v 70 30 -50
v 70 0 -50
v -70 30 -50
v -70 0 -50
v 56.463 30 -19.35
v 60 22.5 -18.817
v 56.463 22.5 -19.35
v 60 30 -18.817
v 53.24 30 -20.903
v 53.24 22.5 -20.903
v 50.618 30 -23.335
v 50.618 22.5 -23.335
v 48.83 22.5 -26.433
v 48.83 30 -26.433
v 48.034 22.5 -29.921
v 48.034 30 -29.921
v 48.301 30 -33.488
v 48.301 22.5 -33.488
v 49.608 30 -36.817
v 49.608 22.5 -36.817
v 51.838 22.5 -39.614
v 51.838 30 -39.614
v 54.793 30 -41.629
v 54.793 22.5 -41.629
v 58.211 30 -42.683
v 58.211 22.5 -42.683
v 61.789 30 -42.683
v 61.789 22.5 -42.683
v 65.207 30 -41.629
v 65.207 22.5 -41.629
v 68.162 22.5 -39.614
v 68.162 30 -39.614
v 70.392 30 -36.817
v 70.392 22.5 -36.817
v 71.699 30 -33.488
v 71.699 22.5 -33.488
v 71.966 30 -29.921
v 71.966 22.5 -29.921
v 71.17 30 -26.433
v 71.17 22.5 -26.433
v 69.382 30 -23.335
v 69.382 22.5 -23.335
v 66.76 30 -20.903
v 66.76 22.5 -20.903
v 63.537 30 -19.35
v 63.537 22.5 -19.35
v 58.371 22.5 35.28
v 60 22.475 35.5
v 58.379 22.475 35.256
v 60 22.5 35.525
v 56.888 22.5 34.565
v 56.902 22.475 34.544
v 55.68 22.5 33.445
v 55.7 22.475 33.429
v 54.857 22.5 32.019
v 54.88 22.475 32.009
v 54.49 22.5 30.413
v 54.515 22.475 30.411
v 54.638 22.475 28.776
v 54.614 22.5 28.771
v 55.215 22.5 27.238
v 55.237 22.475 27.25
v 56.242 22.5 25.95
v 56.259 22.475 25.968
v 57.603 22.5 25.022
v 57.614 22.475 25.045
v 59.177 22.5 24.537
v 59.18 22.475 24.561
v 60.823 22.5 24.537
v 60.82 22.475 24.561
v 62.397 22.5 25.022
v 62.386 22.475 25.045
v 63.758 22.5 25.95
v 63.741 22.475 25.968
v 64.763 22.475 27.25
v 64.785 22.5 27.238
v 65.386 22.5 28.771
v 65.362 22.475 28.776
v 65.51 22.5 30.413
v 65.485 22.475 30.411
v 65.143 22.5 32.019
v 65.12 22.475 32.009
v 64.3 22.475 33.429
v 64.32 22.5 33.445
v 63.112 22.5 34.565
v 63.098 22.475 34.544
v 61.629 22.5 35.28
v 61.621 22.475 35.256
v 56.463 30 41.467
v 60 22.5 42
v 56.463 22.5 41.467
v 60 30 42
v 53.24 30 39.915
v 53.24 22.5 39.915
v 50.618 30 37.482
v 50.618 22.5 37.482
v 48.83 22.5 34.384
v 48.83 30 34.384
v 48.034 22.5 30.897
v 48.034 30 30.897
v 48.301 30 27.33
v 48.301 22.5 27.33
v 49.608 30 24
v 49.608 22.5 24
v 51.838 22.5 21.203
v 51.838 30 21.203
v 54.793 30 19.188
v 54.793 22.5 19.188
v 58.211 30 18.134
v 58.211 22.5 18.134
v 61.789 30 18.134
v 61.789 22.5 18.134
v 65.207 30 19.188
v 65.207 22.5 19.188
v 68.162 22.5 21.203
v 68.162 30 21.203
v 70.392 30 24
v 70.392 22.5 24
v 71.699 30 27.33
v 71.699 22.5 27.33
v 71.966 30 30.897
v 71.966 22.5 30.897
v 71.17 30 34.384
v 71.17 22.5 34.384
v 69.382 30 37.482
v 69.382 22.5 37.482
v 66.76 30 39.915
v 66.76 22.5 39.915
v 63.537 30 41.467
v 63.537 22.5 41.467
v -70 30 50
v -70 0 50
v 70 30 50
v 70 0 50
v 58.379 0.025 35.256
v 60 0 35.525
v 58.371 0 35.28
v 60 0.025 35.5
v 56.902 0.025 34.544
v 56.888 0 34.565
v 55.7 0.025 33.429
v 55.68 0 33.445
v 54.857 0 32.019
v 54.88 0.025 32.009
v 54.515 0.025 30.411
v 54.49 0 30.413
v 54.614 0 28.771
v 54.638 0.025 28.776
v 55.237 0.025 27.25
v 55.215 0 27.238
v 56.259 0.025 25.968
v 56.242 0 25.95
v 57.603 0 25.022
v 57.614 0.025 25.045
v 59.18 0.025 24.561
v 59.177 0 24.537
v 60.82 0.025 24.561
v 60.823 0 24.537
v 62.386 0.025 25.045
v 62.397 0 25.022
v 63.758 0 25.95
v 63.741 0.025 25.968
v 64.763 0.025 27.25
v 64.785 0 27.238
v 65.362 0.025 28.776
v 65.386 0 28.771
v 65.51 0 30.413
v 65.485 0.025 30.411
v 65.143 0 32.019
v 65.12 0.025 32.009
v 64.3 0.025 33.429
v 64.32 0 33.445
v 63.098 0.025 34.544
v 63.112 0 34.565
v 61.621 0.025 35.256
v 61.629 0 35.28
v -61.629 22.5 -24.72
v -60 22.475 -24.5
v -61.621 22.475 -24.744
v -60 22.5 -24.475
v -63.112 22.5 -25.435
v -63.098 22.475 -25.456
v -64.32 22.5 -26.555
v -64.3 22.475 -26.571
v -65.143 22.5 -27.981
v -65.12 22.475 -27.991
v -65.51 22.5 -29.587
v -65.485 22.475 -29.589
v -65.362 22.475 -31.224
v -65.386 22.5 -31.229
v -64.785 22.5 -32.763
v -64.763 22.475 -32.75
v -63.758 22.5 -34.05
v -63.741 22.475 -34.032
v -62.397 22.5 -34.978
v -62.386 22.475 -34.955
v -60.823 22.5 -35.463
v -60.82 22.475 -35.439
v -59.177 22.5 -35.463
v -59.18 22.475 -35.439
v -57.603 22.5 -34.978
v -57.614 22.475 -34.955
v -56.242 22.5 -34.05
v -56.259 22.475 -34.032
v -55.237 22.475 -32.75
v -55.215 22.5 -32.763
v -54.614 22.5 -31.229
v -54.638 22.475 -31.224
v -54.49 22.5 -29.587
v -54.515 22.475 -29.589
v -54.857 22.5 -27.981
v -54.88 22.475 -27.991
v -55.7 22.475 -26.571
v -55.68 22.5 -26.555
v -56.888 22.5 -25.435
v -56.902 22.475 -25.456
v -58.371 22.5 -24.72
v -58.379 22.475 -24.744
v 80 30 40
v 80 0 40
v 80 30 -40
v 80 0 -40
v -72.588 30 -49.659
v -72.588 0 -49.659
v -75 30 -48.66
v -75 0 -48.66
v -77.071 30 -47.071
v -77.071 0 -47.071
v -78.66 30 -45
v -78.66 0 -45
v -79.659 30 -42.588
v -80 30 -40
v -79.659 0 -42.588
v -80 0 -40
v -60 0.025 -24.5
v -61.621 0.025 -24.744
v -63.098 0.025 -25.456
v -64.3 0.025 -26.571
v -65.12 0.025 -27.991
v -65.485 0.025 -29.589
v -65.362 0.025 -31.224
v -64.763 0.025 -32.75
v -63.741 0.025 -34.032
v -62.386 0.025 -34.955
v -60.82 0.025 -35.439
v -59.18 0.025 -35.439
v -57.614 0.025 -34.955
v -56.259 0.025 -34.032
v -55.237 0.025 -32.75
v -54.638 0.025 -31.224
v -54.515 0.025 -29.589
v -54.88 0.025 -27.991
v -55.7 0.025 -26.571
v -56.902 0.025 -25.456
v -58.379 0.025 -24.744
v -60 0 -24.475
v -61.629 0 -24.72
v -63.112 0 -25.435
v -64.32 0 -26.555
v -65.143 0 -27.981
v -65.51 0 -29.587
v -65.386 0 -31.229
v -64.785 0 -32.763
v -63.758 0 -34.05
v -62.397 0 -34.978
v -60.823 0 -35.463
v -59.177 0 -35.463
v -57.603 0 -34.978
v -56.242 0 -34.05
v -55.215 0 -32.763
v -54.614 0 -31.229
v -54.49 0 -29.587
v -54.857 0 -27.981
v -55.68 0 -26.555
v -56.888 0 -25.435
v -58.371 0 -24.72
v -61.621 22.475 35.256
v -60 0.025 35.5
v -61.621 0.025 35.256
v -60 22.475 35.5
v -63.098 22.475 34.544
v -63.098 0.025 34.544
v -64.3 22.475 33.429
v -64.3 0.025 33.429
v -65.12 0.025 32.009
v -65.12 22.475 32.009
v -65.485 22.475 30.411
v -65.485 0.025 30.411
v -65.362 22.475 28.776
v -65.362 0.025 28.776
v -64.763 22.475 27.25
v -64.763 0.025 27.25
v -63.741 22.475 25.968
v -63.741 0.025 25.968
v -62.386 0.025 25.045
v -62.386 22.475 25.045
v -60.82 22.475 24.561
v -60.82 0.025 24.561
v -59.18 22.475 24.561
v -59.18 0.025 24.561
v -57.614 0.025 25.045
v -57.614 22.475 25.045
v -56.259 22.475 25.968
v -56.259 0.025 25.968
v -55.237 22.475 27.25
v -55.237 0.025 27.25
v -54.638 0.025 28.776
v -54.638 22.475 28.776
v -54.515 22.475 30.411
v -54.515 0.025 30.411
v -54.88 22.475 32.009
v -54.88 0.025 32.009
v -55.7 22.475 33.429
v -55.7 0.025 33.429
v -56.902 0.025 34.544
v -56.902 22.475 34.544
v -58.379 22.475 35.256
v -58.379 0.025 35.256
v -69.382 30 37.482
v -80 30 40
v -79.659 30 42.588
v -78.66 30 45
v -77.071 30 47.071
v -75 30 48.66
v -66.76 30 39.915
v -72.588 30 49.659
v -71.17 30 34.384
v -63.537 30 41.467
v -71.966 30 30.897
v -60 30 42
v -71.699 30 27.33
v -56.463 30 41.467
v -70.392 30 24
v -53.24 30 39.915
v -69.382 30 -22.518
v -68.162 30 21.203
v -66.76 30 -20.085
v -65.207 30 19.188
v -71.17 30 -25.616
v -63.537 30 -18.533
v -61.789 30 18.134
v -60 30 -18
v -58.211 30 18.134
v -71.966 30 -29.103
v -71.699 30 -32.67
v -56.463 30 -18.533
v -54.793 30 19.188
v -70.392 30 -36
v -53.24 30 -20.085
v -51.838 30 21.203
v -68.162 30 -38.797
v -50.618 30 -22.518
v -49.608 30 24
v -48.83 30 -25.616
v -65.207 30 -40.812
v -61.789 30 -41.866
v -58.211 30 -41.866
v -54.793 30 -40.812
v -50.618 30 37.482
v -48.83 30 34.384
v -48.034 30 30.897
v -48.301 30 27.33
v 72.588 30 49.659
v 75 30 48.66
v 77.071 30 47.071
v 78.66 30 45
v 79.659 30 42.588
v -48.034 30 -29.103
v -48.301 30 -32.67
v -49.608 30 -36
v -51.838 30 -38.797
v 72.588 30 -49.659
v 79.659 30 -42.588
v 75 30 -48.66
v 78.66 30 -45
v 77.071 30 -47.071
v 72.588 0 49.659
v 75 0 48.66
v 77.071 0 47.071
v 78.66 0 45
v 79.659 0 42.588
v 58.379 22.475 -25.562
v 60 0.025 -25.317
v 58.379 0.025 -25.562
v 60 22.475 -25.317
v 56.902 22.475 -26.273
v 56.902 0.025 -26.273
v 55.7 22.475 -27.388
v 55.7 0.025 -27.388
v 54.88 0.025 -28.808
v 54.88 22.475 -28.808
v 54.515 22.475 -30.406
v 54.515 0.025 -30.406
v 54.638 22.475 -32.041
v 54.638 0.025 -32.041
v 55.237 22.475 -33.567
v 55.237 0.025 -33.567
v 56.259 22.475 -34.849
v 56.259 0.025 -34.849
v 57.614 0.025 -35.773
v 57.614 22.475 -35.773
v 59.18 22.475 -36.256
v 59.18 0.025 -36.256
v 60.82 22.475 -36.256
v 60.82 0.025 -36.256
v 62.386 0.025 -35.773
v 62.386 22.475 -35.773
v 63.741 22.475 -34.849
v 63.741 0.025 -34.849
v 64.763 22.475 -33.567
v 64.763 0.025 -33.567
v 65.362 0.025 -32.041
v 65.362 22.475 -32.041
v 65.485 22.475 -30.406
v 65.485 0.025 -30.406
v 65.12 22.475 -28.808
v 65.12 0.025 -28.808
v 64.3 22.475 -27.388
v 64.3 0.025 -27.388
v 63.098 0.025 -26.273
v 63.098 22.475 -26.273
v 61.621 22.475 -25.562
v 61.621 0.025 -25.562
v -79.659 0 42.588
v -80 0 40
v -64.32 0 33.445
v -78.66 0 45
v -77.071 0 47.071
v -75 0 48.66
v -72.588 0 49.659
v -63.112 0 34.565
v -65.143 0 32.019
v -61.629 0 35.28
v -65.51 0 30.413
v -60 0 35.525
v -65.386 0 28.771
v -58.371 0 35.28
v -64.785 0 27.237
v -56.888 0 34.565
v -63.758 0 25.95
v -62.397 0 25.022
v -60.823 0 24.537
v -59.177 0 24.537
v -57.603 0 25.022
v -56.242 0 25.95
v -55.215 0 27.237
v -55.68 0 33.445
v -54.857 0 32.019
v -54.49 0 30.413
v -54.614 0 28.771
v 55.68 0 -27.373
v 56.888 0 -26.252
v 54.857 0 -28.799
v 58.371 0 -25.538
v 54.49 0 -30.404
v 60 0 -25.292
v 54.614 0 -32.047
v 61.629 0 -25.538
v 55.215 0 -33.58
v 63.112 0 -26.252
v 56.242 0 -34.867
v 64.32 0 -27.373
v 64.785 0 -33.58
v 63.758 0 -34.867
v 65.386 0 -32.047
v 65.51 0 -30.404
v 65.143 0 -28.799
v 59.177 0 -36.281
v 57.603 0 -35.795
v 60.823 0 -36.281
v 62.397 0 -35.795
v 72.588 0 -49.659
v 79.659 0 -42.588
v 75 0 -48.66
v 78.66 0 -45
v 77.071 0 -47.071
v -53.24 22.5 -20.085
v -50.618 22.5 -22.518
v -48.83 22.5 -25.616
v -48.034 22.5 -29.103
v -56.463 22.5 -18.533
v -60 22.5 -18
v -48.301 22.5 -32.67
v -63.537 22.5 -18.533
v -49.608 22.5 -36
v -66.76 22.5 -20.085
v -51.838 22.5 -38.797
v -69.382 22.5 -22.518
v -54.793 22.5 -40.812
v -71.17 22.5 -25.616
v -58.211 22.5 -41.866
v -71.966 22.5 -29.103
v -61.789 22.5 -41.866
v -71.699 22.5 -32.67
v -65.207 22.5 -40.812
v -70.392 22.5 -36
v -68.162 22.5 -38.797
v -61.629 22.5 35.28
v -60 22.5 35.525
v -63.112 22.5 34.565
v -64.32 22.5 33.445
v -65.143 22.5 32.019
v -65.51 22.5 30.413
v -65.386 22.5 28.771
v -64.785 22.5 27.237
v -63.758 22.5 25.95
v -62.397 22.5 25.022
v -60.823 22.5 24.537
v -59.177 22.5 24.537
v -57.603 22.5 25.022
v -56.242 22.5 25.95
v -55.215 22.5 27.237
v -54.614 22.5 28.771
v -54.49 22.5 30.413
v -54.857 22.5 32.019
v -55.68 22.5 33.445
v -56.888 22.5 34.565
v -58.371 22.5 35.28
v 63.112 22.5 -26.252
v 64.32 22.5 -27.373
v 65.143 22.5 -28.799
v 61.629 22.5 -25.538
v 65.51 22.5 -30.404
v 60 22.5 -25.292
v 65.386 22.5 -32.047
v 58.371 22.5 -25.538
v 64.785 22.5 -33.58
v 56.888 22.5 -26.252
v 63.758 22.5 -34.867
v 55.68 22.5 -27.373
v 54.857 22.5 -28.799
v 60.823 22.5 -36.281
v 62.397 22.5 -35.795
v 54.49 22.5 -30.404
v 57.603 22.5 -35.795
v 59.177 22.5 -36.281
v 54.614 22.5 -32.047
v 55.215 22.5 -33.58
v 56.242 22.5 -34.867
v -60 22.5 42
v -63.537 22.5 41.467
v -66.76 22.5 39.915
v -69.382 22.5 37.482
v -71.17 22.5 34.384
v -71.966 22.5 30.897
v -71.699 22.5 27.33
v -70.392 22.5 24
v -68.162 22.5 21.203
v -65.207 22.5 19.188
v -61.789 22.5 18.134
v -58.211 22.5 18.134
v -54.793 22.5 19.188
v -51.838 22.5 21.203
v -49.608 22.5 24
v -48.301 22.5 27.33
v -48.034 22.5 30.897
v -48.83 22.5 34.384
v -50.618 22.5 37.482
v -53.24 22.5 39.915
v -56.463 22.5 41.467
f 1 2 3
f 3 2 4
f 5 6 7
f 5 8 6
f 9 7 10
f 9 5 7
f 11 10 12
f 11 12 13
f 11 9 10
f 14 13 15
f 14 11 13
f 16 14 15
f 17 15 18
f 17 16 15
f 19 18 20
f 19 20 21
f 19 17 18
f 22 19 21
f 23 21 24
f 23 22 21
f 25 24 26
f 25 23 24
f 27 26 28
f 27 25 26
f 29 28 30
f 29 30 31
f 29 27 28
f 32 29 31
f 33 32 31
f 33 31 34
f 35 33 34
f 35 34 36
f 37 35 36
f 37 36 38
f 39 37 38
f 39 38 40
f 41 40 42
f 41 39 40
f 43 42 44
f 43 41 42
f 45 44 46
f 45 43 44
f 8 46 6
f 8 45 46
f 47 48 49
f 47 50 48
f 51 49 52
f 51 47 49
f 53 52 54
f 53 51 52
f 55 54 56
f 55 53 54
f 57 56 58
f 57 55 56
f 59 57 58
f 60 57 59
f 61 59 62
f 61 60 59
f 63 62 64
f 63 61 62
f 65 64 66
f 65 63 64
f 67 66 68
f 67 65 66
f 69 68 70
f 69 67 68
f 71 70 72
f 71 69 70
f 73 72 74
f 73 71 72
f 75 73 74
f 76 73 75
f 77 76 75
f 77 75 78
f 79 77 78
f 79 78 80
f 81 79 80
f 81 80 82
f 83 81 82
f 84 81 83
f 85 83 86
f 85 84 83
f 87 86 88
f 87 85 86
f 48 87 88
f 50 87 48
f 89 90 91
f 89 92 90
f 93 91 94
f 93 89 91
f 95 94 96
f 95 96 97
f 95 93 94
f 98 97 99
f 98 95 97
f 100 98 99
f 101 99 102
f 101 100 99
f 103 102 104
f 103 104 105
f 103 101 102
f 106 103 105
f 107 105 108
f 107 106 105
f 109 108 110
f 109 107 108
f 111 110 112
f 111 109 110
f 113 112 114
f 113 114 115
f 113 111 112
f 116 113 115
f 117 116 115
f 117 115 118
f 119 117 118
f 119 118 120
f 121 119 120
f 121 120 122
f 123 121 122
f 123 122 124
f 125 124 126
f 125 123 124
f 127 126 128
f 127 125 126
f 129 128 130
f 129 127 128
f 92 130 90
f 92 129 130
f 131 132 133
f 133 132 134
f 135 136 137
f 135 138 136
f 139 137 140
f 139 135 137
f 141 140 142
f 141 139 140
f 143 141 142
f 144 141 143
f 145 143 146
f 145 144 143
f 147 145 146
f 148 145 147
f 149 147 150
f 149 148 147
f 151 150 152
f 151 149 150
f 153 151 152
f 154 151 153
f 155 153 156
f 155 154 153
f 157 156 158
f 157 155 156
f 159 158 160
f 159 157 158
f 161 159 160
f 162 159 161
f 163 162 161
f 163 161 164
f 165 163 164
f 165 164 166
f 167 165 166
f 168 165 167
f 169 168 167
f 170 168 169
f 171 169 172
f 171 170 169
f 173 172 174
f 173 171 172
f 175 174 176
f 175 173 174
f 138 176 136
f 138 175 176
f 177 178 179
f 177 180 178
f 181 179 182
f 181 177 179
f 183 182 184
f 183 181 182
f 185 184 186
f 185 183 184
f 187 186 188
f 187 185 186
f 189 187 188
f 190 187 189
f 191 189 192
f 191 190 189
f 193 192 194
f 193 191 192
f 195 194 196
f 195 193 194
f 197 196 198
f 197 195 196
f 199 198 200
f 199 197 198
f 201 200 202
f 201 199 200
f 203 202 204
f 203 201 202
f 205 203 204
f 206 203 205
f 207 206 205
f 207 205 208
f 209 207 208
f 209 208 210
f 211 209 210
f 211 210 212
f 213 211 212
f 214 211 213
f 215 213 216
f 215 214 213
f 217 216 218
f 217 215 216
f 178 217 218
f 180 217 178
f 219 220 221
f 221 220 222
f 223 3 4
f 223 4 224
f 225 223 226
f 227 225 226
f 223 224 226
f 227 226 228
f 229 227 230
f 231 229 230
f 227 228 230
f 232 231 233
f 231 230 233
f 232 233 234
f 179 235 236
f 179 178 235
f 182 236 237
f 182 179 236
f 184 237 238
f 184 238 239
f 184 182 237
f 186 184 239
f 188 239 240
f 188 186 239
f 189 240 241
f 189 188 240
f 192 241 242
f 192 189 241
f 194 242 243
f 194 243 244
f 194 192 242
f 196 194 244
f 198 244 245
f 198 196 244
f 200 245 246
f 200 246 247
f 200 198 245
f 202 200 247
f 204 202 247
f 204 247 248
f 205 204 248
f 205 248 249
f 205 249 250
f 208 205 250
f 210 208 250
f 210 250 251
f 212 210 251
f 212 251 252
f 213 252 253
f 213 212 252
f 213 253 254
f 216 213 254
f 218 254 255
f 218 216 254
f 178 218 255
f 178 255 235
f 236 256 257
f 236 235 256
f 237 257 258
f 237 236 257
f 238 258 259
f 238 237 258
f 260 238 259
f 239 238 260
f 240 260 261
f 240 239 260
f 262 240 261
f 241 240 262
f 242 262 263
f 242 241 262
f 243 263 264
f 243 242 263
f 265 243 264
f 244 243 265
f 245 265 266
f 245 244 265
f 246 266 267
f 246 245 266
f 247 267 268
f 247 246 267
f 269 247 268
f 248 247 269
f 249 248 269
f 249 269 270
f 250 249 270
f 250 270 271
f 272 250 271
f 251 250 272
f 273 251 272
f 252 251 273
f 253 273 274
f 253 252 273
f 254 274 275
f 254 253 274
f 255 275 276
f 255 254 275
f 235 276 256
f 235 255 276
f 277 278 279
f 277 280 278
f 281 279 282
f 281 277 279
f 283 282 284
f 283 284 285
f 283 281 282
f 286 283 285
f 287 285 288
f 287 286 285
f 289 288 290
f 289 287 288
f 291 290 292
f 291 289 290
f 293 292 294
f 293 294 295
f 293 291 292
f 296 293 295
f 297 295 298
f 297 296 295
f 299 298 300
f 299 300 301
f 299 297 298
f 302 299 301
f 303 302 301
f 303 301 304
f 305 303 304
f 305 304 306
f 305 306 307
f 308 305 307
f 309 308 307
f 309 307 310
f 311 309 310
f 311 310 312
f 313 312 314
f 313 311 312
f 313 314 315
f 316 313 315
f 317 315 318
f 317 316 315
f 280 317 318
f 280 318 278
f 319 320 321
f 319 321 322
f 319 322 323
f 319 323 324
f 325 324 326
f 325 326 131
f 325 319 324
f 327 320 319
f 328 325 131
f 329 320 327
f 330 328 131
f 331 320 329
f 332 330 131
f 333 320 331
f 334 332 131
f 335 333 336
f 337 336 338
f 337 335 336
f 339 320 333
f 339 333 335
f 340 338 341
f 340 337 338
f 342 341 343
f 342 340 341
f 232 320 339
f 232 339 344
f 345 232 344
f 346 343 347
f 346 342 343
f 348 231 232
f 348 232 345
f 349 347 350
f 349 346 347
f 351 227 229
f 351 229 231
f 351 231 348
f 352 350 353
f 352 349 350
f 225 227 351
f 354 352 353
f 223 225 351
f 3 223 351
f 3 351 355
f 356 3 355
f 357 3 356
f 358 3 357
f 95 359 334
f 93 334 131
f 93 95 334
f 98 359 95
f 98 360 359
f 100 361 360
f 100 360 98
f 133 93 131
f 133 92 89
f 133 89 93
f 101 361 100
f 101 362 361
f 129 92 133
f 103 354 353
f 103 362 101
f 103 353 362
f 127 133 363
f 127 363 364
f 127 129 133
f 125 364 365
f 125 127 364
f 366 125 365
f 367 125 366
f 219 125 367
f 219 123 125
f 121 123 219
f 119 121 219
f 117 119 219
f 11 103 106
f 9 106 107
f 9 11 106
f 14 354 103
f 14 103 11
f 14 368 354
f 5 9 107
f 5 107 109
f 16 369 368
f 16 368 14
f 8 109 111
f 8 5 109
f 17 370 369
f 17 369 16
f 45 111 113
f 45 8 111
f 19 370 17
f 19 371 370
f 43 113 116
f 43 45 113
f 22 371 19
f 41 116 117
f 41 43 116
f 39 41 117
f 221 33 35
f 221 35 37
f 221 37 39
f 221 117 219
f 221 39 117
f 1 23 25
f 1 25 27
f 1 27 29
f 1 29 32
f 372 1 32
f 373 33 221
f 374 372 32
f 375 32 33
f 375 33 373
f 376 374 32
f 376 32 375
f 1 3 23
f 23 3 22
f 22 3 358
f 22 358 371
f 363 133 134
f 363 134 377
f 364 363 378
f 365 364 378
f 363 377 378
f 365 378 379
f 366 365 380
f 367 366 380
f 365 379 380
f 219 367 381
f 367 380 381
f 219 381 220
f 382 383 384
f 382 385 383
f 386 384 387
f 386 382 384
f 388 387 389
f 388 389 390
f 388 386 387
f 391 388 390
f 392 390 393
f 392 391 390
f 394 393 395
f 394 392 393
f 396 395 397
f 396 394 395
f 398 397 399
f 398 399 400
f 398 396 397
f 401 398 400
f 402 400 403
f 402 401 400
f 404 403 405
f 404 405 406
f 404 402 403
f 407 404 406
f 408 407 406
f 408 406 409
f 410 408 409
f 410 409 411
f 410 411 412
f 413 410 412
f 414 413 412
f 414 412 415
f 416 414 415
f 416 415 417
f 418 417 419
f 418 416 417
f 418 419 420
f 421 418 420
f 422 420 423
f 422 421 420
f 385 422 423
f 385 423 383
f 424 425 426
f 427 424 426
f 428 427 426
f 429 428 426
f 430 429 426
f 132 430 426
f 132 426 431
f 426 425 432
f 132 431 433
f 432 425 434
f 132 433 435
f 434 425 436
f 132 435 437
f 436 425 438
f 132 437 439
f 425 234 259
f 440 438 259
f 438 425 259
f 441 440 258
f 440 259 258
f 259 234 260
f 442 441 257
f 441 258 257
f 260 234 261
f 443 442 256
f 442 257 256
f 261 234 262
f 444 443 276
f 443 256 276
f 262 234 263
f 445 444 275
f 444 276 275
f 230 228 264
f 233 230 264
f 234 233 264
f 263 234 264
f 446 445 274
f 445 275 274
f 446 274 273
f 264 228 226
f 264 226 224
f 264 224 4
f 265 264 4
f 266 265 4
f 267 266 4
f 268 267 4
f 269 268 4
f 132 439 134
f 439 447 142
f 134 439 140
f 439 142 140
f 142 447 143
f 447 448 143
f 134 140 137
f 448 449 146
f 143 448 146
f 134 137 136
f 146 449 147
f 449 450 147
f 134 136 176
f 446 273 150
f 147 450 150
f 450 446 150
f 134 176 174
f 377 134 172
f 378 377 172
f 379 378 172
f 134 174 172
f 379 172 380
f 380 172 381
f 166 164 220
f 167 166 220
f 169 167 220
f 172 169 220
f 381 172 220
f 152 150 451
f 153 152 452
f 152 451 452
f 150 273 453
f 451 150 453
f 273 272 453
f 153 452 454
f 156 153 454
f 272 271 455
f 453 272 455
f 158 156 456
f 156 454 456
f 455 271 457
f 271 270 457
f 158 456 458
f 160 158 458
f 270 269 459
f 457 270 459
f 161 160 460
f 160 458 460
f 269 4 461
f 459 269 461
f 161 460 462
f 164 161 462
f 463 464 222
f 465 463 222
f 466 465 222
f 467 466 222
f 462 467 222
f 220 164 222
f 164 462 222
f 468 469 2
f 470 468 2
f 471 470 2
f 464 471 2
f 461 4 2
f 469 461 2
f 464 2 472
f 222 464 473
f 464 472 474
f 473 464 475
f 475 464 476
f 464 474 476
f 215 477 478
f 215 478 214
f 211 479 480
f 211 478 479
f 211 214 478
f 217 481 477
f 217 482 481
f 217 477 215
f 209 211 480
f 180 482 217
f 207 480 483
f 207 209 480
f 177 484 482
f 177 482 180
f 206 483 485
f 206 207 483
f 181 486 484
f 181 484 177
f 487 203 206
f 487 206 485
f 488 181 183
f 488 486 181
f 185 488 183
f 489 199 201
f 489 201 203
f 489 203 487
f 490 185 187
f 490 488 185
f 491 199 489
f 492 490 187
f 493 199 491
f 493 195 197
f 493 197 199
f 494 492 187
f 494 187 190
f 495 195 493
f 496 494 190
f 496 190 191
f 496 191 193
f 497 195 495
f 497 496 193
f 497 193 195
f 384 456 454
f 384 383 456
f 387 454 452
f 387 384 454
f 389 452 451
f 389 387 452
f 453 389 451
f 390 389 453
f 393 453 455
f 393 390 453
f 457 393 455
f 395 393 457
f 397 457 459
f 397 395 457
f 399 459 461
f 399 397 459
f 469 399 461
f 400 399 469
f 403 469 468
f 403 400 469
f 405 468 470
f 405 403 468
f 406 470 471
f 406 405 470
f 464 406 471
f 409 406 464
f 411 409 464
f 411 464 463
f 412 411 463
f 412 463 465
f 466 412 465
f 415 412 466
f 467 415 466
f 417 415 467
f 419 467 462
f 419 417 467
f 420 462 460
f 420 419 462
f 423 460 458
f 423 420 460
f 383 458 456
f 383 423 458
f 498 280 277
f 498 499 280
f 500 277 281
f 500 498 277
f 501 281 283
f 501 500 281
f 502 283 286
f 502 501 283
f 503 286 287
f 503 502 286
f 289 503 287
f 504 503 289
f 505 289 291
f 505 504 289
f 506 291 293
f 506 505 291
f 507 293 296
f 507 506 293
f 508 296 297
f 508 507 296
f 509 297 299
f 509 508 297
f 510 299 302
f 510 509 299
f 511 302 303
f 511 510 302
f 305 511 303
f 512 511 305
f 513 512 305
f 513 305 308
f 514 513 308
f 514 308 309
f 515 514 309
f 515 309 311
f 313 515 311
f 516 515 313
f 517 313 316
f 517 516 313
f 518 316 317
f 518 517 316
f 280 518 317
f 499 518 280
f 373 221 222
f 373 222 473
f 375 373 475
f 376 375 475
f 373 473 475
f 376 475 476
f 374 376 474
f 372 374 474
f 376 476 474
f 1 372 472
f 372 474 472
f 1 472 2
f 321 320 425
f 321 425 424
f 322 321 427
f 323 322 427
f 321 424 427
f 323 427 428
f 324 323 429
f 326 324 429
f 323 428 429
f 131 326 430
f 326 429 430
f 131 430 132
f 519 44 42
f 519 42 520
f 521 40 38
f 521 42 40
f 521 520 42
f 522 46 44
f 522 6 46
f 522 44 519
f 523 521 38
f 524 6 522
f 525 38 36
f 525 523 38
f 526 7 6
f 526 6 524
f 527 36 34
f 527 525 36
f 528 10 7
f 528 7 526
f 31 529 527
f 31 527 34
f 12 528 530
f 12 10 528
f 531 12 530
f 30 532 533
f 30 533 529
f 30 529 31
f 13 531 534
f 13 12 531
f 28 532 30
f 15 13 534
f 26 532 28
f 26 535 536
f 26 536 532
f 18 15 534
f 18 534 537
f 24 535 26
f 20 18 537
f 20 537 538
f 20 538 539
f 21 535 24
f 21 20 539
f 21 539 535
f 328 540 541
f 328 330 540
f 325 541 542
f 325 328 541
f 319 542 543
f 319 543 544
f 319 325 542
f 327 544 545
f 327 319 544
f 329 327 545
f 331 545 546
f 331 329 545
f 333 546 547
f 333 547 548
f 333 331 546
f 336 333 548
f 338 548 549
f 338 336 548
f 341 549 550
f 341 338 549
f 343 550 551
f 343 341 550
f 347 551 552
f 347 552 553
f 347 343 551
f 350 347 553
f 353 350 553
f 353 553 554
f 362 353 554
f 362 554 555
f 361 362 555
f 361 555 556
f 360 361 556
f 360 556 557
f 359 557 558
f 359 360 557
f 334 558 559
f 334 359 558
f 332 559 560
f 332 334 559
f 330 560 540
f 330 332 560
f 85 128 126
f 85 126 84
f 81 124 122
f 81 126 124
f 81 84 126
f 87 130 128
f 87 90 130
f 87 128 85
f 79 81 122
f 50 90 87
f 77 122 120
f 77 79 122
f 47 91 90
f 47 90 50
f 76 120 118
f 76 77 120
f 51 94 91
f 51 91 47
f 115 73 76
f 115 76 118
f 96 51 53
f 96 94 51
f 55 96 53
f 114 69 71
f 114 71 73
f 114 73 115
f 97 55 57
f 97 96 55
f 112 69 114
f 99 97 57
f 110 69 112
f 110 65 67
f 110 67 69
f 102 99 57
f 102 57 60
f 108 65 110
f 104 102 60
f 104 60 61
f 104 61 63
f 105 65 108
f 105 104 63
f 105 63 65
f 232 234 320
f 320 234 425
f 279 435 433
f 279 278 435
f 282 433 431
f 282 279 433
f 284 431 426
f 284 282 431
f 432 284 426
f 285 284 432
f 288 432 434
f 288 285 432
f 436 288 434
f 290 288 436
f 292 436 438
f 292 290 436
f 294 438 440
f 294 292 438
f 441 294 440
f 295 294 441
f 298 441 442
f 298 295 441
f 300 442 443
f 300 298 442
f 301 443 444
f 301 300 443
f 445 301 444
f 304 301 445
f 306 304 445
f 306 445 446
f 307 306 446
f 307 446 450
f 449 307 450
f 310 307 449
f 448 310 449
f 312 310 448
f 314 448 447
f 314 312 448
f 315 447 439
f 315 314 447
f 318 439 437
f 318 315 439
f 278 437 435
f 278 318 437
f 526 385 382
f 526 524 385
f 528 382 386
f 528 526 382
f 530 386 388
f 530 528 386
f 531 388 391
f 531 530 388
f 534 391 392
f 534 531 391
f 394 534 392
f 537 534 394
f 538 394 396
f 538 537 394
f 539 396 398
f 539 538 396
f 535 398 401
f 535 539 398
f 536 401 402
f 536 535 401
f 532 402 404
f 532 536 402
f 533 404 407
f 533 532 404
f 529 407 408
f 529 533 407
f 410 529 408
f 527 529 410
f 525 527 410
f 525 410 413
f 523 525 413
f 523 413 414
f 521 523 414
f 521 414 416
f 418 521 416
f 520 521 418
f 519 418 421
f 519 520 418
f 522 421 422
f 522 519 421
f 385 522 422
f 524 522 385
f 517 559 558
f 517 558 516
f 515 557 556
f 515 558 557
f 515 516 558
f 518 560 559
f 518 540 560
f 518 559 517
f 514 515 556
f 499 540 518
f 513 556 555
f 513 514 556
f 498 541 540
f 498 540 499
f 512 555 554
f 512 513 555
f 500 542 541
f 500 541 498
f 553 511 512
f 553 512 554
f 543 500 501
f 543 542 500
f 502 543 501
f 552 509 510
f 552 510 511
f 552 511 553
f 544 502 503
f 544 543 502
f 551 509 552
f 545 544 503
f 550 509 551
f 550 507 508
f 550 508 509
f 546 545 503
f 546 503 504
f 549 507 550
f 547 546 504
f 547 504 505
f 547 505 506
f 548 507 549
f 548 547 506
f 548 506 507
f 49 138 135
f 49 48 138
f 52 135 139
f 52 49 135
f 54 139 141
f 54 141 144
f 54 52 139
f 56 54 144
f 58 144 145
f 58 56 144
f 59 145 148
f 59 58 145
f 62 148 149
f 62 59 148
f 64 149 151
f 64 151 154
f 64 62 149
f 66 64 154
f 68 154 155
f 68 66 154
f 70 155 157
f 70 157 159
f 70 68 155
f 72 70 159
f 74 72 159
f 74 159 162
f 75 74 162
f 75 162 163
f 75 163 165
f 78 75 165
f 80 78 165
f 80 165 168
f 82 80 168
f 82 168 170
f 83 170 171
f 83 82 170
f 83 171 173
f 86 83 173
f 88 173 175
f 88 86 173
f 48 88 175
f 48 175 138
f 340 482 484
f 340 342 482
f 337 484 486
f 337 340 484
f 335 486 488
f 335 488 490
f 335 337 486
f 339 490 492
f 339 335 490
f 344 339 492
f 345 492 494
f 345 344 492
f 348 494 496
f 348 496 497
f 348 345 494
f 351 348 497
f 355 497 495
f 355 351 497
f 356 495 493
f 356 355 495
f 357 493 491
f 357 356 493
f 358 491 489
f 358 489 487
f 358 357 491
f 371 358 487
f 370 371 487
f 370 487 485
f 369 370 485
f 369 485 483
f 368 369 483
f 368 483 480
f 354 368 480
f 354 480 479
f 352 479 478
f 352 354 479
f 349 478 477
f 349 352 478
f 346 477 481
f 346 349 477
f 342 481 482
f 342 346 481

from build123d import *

# Parameters (mm, degrees)
SALIENTE_EXTRUIR1_DEPTH                     = 30
REFRENTADO_PARA_TORNILLO_CON_CABEZA_2_COUNT = 2
REFRENTADO_PARA_TORNILLO_CON_CABEZA_2_PITCH = 120.002783684
REFRENTADO_PARA_TORNILLO_CON_CABEZA_3_COUNT = 2
REFRENTADO_PARA_TORNILLO_CON_CABEZA_3_PITCH = 60
REFRENTADO_PARA_TORNILLO_CON_CABEZA_4_COUNT = 2
REFRENTADO_PARA_TORNILLO_CON_CABEZA_4_PITCH = 134.16407865


with BuildPart() as part:
    # Croquis1 → Saliente-Extruir1 (new body)
    with BuildSketch(Plane(origin=(0, 0, 0), x_dir=(1, 0, 0), z_dir=(0, 1, 0))):
        with BuildLine():
            Line((-70, -50), (70, -50))
            ThreePointArc((70, -50), (77.071067812, -47.071067812), (80, -40))
            Line((80, -40), (80, 40))
            ThreePointArc((80, 40), (77.071067812, 47.071067812), (70, 50))
            Line((70, 50), (-70, 50))
            ThreePointArc((-70, 50), (-77.071067812, 47.071067812), (-80, 40))
            Line((-80, 40), (-80, -40))
            ThreePointArc((-80, -40), (-77.071067812, -47.071067812), (-70, -50))
        make_face()
    extrude(amount=SALIENTE_EXTRUIR1_DEPTH)

    # Croquis5 → Refrentado para tornillo con cabeza troncocónica de M101 (revolve, cut)
    with BuildSketch(Plane(origin=(-60, 30, -30), x_dir=(0, 0, 1), z_dir=(1, 0, 0))):
        Polygon((0, 0), (0, 30), (5.525, 30), (5.5, 29.975), (5.5, 7.525), (5.525, 7.5), (12, 7.5), (12, 0), align=None)
    refrentado_para_tornillo_con_cabeza_tron = revolve(axis=Axis((-60, 36.35, -30), (0, -1, 0)), mode=Mode.SUBTRACT)

    # Refrentado para tornillo con cabeza  2: Refrentado para tornillo con cabeza troncocónica de M101 ×2
    with Locations(*[Vector(0.9999768031686442, 0, -0.006811249857308006) * (i * REFRENTADO_PARA_TORNILLO_CON_CABEZA_2_PITCH) for i in range(1, REFRENTADO_PARA_TORNILLO_CON_CABEZA_2_COUNT)]):
        add(refrentado_para_tornillo_con_cabeza_tron, mode=Mode.SUBTRACT)

    # Refrentado para tornillo con cabeza  3: Refrentado para tornillo con cabeza troncocónica de M101 ×2
    with Locations(*[(0, 0, i * REFRENTADO_PARA_TORNILLO_CON_CABEZA_3_PITCH) for i in range(1, REFRENTADO_PARA_TORNILLO_CON_CABEZA_3_COUNT)]):
        add(refrentado_para_tornillo_con_cabeza_tron, mode=Mode.SUBTRACT)

    # Refrentado para tornillo con cabeza  4: Refrentado para tornillo con cabeza troncocónica de M101 ×2
    with Locations(*[Vector(0.894427190999916, 0, 0.447213595499958) * (i * REFRENTADO_PARA_TORNILLO_CON_CABEZA_4_PITCH) for i in range(1, REFRENTADO_PARA_TORNILLO_CON_CABEZA_4_COUNT)]):
        add(refrentado_para_tornillo_con_cabeza_tron, mode=Mode.SUBTRACT)


solid = part.part
